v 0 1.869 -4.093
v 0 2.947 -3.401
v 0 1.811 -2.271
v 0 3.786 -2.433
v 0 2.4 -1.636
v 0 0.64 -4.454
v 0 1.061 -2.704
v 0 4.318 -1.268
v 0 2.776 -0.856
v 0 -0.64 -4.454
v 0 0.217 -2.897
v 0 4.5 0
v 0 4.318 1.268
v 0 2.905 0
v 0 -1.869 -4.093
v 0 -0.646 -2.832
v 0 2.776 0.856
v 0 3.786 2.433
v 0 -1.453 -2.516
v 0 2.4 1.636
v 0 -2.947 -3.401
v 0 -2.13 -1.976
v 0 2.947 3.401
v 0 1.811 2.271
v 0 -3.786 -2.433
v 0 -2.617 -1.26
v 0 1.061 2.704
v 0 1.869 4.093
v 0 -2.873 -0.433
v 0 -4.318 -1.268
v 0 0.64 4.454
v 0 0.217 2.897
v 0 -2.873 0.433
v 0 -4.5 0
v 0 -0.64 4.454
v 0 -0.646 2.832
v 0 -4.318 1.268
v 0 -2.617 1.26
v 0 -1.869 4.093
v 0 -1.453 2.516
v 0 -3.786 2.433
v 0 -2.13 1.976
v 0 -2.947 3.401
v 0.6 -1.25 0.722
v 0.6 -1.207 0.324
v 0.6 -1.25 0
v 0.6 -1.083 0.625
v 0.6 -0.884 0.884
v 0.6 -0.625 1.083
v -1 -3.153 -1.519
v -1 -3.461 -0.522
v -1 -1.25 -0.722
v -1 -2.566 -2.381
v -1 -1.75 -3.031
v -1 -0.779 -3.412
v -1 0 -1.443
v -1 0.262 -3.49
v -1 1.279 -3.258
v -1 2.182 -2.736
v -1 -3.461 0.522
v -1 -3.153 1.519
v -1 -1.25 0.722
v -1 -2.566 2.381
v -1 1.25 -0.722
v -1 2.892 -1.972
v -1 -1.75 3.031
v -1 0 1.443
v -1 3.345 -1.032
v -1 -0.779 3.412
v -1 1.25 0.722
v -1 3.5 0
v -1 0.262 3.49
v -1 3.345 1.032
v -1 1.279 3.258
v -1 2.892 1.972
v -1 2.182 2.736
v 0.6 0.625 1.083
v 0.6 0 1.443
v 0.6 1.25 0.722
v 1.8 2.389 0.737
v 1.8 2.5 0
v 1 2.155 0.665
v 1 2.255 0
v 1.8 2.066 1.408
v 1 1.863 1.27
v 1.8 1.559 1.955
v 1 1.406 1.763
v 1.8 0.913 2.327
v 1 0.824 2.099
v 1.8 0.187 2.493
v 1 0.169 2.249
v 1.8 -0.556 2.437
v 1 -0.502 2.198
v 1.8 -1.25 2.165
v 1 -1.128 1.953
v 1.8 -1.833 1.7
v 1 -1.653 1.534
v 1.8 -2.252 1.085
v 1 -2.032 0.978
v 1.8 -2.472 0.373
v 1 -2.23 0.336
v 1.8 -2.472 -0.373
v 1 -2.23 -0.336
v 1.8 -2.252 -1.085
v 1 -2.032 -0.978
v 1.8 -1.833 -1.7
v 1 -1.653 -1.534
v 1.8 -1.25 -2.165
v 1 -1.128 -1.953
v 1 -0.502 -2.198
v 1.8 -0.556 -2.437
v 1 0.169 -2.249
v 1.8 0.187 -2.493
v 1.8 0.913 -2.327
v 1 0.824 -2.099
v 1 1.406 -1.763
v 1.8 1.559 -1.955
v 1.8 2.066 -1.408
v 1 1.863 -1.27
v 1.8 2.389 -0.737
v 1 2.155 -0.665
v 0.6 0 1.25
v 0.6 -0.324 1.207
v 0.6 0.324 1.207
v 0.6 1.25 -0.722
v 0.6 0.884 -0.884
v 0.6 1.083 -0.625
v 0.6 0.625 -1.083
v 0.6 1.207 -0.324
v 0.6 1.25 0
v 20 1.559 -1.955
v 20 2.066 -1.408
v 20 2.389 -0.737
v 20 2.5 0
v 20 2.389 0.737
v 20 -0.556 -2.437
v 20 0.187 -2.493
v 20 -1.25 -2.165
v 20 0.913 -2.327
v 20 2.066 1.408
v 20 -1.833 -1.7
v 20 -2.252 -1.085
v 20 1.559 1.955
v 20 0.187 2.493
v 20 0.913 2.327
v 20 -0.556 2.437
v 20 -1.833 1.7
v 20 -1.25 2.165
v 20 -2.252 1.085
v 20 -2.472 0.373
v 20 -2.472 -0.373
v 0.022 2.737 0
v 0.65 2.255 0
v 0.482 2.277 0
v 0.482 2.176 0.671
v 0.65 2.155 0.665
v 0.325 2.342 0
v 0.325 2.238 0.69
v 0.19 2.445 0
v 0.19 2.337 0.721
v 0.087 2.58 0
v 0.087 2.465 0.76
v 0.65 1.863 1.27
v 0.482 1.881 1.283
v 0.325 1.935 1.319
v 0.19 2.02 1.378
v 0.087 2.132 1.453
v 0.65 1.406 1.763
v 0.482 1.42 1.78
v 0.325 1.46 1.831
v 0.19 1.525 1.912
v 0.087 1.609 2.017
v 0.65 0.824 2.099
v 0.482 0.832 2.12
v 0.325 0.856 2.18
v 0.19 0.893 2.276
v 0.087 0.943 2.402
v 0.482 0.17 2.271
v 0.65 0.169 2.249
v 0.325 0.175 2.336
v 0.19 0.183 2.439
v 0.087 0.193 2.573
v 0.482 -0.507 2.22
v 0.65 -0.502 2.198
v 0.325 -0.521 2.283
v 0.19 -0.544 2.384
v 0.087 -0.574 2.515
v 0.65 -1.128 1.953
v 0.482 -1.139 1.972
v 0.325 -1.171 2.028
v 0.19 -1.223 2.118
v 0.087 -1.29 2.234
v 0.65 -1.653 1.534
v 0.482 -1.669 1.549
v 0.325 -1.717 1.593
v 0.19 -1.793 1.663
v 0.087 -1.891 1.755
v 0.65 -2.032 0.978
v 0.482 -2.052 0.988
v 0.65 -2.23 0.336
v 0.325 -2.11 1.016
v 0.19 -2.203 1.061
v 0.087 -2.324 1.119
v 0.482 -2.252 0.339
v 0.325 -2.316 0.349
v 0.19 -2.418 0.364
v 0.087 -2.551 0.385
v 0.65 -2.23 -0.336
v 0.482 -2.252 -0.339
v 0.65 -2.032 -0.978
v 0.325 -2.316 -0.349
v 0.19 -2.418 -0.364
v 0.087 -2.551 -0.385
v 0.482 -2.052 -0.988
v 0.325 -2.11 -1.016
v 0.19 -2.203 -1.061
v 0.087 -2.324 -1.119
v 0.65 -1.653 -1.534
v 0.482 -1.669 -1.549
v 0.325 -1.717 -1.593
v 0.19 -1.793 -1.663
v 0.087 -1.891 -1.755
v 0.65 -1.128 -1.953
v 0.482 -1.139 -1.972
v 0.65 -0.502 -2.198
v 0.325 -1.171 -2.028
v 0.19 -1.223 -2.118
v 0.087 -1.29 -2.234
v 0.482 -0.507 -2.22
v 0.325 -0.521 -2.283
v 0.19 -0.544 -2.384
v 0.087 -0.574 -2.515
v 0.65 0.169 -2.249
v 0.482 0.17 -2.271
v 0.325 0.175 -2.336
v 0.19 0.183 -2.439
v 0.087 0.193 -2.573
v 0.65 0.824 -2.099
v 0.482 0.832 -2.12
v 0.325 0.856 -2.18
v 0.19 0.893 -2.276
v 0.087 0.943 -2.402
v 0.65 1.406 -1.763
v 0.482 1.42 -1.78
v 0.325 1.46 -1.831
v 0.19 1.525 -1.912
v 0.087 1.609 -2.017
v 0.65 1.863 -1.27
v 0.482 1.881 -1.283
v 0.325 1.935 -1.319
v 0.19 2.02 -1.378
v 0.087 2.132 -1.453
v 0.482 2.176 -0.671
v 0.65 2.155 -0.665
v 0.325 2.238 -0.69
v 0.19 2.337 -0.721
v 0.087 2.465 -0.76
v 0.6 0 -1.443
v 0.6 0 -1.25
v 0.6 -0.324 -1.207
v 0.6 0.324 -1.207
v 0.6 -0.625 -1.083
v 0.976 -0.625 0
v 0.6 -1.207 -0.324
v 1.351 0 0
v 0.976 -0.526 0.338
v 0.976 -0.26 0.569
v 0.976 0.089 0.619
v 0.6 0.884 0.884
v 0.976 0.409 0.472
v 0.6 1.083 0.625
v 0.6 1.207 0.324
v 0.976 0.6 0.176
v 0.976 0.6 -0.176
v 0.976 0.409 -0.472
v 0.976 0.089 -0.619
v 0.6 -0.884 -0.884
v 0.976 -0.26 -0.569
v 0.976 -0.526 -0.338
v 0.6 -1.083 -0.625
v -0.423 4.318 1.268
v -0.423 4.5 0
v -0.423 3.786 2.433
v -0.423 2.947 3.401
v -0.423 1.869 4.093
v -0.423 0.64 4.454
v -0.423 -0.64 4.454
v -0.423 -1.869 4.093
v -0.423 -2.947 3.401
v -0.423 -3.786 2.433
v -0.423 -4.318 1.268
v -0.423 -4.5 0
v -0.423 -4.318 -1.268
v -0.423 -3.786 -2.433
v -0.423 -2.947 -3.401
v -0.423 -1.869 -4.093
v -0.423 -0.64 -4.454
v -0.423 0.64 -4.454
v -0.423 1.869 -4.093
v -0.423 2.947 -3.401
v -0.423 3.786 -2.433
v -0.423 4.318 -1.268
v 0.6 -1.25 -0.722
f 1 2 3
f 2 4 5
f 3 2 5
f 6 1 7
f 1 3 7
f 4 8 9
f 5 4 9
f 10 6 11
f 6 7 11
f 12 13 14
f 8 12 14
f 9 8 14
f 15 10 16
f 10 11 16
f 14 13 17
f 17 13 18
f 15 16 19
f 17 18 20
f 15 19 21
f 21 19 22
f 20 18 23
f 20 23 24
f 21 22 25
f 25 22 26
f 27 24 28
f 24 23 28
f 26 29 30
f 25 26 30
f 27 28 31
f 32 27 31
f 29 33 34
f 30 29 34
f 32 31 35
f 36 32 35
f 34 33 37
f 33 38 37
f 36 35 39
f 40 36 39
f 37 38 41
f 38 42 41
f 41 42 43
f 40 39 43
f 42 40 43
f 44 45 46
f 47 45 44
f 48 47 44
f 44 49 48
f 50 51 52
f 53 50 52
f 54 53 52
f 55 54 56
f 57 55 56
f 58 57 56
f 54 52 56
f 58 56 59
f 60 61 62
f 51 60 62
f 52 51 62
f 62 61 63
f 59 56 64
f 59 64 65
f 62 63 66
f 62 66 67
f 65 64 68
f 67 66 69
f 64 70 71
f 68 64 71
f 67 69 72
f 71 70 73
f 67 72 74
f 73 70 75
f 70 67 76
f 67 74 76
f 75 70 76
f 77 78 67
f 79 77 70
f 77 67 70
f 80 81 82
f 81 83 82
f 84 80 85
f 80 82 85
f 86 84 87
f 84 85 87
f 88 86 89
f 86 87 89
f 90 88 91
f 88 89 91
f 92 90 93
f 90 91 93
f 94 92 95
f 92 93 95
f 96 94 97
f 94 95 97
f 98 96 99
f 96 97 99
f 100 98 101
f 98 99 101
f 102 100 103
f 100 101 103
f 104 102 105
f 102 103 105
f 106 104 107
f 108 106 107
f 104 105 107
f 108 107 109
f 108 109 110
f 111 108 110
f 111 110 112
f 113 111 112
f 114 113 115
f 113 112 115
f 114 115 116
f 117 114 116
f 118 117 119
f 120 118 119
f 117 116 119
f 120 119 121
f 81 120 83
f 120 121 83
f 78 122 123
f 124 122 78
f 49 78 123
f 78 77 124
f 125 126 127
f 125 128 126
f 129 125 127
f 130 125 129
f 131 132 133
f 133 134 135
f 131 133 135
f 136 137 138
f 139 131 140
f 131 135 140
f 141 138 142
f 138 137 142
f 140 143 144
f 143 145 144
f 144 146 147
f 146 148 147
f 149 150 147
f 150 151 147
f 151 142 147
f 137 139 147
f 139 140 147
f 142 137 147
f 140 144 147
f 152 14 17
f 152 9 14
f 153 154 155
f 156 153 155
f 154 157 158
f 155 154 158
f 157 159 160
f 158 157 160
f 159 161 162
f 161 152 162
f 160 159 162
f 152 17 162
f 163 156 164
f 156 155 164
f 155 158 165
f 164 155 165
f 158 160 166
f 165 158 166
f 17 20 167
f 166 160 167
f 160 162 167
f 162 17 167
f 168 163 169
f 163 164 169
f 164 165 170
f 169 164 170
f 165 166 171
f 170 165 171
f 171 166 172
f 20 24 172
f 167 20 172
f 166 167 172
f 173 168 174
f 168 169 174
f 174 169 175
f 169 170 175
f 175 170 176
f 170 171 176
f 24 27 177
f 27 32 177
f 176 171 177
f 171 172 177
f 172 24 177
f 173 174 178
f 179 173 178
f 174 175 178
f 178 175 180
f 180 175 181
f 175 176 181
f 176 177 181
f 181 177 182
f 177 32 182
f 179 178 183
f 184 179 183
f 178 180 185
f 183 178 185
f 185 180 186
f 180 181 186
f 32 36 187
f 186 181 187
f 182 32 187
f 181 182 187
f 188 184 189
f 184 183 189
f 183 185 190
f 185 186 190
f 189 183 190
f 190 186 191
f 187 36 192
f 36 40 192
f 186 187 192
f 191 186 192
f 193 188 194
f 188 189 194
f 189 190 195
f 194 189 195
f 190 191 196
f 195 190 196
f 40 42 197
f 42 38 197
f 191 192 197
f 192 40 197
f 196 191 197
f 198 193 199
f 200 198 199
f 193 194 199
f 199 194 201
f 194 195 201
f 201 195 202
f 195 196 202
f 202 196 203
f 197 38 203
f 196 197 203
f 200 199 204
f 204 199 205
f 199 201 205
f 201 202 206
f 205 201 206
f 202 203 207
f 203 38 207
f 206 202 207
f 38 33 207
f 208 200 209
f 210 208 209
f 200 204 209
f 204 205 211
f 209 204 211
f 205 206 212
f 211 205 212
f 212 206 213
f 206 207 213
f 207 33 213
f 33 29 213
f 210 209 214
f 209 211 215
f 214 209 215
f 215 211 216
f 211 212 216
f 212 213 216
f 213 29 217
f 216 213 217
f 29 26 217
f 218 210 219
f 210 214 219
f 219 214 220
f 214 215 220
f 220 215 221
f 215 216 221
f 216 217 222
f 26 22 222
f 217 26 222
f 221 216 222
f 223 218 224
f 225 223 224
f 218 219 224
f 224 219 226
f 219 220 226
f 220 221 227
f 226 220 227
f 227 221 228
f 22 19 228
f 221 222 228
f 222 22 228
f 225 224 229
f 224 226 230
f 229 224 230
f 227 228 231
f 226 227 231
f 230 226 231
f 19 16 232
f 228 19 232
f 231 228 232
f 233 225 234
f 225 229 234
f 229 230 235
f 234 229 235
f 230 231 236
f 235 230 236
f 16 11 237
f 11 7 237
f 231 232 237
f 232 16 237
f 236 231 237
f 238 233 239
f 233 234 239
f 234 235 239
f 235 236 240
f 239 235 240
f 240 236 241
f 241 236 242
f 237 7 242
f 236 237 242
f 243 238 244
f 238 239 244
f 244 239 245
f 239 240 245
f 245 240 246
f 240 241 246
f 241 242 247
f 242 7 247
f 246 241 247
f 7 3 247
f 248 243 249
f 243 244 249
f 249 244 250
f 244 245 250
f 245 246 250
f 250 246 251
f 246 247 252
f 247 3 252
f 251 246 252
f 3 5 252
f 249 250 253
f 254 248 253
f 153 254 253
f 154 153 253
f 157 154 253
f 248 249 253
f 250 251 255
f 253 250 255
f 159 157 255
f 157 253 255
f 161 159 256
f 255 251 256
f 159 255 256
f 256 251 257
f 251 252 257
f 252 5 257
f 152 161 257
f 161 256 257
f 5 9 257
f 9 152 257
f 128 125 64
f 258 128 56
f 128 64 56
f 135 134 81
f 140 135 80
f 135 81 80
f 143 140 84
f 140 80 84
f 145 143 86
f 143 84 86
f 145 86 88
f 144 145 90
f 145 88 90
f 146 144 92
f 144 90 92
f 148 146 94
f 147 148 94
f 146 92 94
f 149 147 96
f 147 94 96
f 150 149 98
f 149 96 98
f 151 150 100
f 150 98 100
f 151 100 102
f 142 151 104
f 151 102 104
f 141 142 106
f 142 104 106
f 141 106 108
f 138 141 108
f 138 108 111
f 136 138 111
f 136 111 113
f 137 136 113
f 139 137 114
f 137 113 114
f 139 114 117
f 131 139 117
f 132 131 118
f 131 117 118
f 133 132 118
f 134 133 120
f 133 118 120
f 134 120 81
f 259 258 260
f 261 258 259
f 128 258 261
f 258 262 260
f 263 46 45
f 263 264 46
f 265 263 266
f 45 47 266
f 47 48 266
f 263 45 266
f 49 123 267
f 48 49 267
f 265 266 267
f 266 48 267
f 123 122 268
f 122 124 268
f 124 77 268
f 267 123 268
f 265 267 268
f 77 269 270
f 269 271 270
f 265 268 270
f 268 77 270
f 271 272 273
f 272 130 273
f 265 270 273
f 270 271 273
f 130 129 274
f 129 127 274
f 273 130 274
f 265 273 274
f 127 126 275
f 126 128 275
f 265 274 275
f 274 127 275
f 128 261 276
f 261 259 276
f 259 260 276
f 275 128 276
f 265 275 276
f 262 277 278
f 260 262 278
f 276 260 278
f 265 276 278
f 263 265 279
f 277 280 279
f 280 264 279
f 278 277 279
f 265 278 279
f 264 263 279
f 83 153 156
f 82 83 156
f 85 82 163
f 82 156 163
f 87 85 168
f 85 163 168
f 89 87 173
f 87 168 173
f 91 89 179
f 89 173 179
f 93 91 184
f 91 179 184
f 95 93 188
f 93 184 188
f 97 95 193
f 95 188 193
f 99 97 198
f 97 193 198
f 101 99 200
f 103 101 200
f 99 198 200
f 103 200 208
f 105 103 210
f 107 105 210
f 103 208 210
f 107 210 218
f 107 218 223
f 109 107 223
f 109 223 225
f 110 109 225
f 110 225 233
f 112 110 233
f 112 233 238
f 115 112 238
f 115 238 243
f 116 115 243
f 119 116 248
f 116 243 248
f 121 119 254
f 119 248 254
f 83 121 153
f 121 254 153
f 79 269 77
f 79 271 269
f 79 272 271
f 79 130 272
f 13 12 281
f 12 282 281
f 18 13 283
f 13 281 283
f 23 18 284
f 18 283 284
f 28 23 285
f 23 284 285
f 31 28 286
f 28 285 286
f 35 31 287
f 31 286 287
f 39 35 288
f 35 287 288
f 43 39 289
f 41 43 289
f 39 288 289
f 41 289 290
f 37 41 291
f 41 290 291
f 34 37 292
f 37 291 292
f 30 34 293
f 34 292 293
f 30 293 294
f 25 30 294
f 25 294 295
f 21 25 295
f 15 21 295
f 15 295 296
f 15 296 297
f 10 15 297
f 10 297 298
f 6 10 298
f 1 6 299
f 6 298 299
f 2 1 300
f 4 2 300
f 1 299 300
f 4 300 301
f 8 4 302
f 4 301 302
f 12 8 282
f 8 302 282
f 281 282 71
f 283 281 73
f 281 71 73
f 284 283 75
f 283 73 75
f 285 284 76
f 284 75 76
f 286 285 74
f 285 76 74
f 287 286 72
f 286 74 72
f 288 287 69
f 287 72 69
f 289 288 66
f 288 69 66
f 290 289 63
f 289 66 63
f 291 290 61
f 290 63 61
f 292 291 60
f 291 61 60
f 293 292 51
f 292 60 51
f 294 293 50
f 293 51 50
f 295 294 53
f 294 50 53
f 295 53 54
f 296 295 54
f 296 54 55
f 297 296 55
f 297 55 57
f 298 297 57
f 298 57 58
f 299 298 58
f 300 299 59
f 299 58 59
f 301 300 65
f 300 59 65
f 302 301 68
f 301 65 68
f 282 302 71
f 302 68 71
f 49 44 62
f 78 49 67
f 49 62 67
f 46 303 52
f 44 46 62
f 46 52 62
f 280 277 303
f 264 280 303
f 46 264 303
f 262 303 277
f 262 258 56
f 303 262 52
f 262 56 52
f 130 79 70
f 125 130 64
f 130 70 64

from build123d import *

# Parameters (mm, degrees)
CUT_EXTRUDE1_DEPTH = 1.6
FILLET1_R          = 0.65


with BuildPart() as part:
    # Sketch1 → Revolve1 (revolve)
    with BuildSketch(Plane.XY):
        Polygon((-1, 0), (20, 0), (20, 2.5), (1.8, 2.5), (1, 2.255), (0, 2.255), (0, 4.5), (-0.422649731, 4.5), (-1, 3.5), align=None)
    revolve(axis=Axis((-1, 0, 0), (1, 0, 0)))

    # Sketch2 → Cut-Extrude1 (cut)
    with BuildSketch(Plane.ZY.offset(1)):
        Polygon((-1.443375673, 0), (-0.721687836, -1.25), (0.721687836, -1.25), (1.443375673, 0), (0.721687836, 1.25), (-0.721687836, 1.25), align=None)
    extrude(amount=-CUT_EXTRUDE1_DEPTH, mode=Mode.SUBTRACT)

    # Sketch3 → Cut-Revolve1 (revolve, cut)
    with BuildSketch(Plane.XY):
        Polygon((0.6, -1.25), (0.6, 0), (1.351075774, 0), align=None)
    revolve(axis=Axis((0, 0, 0), (-1, 0, 0)), mode=Mode.SUBTRACT)

    # Fillet1
    fillet1_edges = [part.edges().sort_by_distance(p)[0] for p in [
        (0, -2.255, 0),
    ]]
    fillet(fillet1_edges, radius=FILLET1_R)


solid = part.part
